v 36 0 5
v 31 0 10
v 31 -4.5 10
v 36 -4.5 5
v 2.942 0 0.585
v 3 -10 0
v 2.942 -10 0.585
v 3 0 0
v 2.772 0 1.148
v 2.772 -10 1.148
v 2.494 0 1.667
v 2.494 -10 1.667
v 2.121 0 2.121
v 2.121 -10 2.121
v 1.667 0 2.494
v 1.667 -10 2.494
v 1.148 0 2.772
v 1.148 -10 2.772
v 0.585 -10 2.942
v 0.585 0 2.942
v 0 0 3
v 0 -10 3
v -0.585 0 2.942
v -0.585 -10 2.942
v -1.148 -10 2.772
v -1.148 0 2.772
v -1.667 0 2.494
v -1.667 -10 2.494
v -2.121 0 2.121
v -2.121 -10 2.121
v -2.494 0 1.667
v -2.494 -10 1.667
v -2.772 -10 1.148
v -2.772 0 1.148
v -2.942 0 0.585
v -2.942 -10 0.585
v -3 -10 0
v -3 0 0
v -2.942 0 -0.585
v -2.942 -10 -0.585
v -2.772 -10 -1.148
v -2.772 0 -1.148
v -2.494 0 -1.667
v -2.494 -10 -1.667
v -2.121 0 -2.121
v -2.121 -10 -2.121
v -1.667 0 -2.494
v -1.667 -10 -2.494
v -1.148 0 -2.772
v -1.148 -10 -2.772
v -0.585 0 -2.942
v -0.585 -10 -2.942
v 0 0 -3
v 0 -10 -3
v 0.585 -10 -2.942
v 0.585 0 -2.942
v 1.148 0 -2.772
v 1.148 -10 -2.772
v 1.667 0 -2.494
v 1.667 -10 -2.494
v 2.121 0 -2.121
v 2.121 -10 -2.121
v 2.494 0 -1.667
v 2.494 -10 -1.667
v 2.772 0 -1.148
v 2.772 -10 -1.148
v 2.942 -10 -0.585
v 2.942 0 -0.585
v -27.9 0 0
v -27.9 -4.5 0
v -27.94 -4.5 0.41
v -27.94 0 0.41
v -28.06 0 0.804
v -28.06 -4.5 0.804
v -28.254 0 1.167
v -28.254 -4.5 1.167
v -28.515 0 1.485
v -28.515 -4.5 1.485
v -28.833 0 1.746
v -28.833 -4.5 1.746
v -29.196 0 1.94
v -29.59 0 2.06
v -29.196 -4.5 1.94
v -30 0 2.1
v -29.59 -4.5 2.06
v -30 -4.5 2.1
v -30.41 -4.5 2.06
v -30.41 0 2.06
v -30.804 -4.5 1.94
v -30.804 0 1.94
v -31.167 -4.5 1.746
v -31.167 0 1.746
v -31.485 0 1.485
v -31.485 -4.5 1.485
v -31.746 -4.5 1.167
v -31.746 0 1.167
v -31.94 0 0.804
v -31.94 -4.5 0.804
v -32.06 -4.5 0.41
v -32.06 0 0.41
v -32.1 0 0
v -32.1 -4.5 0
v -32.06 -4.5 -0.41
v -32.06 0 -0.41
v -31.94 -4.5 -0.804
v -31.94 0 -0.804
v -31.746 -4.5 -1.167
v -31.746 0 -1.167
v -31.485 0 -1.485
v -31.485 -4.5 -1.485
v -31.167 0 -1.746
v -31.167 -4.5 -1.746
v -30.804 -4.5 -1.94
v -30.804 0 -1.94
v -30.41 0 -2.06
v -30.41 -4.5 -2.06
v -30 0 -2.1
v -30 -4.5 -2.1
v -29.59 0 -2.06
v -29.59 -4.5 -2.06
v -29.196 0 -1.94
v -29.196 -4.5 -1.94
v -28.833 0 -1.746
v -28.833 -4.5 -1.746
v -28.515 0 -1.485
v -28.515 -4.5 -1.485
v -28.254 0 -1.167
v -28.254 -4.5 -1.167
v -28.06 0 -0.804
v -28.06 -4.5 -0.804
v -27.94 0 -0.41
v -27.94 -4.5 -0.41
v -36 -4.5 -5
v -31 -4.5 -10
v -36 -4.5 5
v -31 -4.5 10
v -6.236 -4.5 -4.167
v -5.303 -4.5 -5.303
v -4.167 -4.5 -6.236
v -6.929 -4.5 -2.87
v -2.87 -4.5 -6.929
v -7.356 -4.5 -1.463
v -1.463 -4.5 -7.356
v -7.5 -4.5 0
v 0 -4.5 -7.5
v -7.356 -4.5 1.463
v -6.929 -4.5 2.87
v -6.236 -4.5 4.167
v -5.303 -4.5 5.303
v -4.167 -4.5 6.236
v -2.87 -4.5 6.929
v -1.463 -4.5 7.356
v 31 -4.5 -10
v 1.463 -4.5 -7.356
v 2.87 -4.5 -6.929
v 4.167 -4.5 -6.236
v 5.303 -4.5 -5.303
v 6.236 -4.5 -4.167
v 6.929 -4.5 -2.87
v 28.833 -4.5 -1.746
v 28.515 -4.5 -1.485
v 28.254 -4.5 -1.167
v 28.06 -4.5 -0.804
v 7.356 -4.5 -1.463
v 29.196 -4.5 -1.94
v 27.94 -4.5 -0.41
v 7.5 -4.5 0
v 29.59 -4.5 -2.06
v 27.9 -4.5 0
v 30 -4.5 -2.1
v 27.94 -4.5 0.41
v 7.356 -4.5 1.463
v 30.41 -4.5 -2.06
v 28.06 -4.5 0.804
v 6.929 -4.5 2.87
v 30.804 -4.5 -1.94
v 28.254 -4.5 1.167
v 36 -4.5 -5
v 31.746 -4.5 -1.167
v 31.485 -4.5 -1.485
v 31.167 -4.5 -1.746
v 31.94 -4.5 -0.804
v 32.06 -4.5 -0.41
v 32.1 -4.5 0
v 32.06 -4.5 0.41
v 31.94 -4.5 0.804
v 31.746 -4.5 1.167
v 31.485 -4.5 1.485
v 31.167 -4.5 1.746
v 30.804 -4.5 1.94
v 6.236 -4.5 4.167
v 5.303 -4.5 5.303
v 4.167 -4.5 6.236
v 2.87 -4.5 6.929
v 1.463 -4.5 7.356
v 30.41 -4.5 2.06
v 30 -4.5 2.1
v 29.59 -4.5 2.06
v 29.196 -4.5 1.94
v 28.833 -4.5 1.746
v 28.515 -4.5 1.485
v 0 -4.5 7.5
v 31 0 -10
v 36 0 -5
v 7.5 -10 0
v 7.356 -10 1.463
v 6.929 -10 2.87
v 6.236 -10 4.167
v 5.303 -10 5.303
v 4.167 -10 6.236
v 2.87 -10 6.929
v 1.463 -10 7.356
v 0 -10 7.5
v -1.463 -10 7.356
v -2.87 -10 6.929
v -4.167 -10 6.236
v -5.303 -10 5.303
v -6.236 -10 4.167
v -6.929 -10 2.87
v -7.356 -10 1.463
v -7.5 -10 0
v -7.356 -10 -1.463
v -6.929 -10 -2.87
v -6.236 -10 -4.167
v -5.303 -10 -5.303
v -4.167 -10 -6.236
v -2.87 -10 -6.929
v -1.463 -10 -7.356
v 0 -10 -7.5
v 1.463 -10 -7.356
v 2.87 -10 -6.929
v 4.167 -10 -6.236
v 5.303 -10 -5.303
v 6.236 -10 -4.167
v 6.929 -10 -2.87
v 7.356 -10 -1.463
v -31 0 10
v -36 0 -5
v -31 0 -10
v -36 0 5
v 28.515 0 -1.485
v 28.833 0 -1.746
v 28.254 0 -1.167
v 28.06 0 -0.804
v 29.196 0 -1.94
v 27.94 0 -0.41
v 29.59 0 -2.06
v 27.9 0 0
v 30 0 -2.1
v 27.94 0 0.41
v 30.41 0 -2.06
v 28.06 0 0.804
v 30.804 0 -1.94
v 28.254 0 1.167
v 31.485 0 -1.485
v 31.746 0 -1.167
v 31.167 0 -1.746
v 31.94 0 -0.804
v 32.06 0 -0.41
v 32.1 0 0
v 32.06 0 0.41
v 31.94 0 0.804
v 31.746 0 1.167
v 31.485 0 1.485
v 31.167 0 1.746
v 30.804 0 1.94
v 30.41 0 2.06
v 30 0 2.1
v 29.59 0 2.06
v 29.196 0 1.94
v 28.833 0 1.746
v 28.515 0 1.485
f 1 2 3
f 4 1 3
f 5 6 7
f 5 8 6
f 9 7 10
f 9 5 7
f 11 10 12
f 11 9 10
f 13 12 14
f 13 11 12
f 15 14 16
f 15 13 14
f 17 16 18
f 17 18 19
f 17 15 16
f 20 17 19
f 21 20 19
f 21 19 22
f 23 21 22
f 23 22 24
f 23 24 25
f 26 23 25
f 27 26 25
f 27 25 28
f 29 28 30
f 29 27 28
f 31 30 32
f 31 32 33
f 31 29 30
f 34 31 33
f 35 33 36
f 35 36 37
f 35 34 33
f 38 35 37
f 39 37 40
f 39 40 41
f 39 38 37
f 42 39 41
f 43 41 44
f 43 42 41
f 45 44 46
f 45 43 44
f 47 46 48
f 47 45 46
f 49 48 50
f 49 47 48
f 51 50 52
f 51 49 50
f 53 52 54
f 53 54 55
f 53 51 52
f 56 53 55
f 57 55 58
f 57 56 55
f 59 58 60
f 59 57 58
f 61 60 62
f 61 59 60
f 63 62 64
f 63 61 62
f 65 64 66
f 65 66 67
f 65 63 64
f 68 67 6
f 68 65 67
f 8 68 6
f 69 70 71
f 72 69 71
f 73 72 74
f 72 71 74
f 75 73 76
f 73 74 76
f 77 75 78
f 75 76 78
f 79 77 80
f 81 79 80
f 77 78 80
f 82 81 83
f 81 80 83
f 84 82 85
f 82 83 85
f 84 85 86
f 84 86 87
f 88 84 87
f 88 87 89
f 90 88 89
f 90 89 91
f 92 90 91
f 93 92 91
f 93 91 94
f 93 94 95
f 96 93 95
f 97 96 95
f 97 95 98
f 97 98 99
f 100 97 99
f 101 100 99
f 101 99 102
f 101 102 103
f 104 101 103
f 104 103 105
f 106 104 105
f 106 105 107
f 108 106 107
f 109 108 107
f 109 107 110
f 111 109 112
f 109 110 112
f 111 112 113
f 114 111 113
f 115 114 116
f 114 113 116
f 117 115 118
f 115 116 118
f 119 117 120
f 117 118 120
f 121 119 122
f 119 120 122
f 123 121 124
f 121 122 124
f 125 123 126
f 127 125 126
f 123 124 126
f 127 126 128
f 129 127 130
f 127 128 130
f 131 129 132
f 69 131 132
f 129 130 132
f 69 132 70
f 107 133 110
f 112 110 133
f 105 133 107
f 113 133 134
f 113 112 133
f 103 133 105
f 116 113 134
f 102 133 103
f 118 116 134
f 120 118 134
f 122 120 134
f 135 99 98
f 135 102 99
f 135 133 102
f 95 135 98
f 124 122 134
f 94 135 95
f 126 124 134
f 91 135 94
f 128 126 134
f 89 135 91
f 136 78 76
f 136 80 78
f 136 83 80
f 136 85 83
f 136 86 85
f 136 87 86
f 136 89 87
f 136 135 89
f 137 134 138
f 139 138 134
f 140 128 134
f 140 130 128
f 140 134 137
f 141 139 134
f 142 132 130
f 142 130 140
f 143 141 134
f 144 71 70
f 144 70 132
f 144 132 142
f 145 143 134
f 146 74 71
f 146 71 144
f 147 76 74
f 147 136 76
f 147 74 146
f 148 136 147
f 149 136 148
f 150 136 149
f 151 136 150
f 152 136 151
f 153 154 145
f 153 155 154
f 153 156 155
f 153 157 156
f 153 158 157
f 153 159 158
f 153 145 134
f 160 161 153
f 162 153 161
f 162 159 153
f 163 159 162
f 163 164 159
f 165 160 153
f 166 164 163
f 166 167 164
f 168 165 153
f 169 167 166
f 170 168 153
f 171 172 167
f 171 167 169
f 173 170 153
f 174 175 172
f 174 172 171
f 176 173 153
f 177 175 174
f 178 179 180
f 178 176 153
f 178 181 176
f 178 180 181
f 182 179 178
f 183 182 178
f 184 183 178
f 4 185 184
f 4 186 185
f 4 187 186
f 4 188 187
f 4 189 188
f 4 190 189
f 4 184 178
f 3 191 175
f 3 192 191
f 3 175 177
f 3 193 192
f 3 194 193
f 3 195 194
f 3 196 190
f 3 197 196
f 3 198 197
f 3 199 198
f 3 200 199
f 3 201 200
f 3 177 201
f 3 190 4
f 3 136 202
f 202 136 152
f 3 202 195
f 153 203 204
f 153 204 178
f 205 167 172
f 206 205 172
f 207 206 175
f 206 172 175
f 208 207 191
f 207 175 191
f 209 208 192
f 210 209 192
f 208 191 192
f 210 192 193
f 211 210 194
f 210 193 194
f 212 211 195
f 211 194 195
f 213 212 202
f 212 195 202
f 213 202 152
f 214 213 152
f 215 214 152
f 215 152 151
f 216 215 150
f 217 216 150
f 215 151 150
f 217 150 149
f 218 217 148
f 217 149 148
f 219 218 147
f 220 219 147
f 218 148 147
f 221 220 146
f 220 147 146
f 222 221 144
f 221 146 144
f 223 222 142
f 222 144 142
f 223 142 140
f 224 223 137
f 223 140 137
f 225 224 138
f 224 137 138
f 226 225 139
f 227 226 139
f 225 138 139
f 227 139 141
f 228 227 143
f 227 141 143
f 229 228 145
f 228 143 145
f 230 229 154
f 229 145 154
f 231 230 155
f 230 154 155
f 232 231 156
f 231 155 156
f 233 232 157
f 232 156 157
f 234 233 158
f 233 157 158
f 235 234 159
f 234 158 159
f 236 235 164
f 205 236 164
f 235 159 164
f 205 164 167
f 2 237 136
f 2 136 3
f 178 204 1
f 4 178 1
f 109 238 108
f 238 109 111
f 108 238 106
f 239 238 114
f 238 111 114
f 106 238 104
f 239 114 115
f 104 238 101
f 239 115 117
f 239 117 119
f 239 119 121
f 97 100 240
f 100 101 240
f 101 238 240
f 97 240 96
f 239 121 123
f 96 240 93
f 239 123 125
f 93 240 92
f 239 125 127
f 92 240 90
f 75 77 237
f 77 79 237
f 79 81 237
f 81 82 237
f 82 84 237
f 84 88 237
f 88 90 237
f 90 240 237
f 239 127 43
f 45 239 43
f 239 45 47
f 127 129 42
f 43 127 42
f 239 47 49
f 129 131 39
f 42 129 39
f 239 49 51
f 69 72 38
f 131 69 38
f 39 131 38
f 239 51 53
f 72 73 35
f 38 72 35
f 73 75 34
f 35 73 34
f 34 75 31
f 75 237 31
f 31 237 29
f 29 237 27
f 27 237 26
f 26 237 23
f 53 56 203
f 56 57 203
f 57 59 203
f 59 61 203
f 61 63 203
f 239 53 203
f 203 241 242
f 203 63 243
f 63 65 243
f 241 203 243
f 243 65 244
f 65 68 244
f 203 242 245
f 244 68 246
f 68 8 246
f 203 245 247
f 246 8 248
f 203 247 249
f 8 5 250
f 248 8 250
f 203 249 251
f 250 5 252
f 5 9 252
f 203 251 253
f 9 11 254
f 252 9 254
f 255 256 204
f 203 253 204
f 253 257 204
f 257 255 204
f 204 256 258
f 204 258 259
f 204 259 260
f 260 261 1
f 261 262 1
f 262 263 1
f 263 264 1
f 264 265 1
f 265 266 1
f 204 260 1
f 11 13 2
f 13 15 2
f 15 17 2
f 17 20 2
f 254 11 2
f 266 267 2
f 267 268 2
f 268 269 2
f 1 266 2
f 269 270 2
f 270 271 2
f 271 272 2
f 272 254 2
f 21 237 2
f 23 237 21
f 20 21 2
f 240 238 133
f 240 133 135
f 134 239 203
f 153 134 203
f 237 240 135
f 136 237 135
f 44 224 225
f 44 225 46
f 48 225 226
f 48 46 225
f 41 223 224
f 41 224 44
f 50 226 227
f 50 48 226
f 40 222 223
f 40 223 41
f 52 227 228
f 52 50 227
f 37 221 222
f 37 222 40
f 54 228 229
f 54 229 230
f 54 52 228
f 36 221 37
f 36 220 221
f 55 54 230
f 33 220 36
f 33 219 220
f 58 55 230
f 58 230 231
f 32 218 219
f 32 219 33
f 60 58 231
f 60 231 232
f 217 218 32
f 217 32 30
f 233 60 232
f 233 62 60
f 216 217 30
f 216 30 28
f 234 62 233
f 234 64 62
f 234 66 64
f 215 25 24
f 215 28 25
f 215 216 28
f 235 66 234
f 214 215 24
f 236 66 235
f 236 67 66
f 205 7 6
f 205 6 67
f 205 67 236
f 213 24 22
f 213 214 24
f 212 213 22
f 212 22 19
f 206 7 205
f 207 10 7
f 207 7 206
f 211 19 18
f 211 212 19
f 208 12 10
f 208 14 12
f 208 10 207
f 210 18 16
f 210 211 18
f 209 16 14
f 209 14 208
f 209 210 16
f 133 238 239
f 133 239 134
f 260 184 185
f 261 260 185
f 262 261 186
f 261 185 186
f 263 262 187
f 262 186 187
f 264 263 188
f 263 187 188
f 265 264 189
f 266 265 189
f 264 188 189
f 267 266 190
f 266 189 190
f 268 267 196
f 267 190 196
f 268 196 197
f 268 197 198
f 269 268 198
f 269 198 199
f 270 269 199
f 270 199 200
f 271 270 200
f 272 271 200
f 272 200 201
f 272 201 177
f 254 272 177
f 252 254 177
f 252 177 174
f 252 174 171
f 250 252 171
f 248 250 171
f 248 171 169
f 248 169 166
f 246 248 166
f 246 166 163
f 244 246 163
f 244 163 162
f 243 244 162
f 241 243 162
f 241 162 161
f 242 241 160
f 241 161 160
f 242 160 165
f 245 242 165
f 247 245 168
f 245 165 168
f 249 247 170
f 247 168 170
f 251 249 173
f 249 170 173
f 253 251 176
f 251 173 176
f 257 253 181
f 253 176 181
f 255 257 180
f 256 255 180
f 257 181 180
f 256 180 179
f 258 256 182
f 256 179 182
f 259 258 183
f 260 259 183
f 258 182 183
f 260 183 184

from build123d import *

# Parameters (mm, degrees)
F0_W     = 72
F0_H     = 20
F0_R     = 3
F1_DEPTH = 4.5
F2_R     = 7.5
F2_R_2   = 3
F3_DEPTH = 5.5
F4_SIZE  = 5
F6_D     = 4.2


with BuildPart() as f1:
    # F0 (on Front) → F1 (new body)
    with BuildSketch(Plane.XZ):
        Rectangle(F0_W, F0_H)
        Circle(F0_R, mode=Mode.SUBTRACT)
    extrude(amount=F1_DEPTH)

    # F2 (on face) → F3 (join)
    with BuildSketch(Plane.XZ.offset(4.5)):
        Circle(F2_R)
        Circle(F2_R_2, mode=Mode.SUBTRACT)
    extrude(amount=F3_DEPTH)

    # F4
    f4_edges = [f1.edges().sort_by_distance(p)[0] for p in [
        (36, -2.25, 10),
        (36, -2.25, -10),
        (-36, -2.25, 10),
        (-36, -2.25, -10),
    ]]
    chamfer(f4_edges, length=F4_SIZE)

    # F6 (through all)
    with Locations(Plane(origin=(0, 0, 0), x_dir=(-1, 0, 0), z_dir=(0, 1, 0))):
        with Locations((-30, 0), (30, 0)):
            Hole(F6_D / 2)


solid = f1.part
